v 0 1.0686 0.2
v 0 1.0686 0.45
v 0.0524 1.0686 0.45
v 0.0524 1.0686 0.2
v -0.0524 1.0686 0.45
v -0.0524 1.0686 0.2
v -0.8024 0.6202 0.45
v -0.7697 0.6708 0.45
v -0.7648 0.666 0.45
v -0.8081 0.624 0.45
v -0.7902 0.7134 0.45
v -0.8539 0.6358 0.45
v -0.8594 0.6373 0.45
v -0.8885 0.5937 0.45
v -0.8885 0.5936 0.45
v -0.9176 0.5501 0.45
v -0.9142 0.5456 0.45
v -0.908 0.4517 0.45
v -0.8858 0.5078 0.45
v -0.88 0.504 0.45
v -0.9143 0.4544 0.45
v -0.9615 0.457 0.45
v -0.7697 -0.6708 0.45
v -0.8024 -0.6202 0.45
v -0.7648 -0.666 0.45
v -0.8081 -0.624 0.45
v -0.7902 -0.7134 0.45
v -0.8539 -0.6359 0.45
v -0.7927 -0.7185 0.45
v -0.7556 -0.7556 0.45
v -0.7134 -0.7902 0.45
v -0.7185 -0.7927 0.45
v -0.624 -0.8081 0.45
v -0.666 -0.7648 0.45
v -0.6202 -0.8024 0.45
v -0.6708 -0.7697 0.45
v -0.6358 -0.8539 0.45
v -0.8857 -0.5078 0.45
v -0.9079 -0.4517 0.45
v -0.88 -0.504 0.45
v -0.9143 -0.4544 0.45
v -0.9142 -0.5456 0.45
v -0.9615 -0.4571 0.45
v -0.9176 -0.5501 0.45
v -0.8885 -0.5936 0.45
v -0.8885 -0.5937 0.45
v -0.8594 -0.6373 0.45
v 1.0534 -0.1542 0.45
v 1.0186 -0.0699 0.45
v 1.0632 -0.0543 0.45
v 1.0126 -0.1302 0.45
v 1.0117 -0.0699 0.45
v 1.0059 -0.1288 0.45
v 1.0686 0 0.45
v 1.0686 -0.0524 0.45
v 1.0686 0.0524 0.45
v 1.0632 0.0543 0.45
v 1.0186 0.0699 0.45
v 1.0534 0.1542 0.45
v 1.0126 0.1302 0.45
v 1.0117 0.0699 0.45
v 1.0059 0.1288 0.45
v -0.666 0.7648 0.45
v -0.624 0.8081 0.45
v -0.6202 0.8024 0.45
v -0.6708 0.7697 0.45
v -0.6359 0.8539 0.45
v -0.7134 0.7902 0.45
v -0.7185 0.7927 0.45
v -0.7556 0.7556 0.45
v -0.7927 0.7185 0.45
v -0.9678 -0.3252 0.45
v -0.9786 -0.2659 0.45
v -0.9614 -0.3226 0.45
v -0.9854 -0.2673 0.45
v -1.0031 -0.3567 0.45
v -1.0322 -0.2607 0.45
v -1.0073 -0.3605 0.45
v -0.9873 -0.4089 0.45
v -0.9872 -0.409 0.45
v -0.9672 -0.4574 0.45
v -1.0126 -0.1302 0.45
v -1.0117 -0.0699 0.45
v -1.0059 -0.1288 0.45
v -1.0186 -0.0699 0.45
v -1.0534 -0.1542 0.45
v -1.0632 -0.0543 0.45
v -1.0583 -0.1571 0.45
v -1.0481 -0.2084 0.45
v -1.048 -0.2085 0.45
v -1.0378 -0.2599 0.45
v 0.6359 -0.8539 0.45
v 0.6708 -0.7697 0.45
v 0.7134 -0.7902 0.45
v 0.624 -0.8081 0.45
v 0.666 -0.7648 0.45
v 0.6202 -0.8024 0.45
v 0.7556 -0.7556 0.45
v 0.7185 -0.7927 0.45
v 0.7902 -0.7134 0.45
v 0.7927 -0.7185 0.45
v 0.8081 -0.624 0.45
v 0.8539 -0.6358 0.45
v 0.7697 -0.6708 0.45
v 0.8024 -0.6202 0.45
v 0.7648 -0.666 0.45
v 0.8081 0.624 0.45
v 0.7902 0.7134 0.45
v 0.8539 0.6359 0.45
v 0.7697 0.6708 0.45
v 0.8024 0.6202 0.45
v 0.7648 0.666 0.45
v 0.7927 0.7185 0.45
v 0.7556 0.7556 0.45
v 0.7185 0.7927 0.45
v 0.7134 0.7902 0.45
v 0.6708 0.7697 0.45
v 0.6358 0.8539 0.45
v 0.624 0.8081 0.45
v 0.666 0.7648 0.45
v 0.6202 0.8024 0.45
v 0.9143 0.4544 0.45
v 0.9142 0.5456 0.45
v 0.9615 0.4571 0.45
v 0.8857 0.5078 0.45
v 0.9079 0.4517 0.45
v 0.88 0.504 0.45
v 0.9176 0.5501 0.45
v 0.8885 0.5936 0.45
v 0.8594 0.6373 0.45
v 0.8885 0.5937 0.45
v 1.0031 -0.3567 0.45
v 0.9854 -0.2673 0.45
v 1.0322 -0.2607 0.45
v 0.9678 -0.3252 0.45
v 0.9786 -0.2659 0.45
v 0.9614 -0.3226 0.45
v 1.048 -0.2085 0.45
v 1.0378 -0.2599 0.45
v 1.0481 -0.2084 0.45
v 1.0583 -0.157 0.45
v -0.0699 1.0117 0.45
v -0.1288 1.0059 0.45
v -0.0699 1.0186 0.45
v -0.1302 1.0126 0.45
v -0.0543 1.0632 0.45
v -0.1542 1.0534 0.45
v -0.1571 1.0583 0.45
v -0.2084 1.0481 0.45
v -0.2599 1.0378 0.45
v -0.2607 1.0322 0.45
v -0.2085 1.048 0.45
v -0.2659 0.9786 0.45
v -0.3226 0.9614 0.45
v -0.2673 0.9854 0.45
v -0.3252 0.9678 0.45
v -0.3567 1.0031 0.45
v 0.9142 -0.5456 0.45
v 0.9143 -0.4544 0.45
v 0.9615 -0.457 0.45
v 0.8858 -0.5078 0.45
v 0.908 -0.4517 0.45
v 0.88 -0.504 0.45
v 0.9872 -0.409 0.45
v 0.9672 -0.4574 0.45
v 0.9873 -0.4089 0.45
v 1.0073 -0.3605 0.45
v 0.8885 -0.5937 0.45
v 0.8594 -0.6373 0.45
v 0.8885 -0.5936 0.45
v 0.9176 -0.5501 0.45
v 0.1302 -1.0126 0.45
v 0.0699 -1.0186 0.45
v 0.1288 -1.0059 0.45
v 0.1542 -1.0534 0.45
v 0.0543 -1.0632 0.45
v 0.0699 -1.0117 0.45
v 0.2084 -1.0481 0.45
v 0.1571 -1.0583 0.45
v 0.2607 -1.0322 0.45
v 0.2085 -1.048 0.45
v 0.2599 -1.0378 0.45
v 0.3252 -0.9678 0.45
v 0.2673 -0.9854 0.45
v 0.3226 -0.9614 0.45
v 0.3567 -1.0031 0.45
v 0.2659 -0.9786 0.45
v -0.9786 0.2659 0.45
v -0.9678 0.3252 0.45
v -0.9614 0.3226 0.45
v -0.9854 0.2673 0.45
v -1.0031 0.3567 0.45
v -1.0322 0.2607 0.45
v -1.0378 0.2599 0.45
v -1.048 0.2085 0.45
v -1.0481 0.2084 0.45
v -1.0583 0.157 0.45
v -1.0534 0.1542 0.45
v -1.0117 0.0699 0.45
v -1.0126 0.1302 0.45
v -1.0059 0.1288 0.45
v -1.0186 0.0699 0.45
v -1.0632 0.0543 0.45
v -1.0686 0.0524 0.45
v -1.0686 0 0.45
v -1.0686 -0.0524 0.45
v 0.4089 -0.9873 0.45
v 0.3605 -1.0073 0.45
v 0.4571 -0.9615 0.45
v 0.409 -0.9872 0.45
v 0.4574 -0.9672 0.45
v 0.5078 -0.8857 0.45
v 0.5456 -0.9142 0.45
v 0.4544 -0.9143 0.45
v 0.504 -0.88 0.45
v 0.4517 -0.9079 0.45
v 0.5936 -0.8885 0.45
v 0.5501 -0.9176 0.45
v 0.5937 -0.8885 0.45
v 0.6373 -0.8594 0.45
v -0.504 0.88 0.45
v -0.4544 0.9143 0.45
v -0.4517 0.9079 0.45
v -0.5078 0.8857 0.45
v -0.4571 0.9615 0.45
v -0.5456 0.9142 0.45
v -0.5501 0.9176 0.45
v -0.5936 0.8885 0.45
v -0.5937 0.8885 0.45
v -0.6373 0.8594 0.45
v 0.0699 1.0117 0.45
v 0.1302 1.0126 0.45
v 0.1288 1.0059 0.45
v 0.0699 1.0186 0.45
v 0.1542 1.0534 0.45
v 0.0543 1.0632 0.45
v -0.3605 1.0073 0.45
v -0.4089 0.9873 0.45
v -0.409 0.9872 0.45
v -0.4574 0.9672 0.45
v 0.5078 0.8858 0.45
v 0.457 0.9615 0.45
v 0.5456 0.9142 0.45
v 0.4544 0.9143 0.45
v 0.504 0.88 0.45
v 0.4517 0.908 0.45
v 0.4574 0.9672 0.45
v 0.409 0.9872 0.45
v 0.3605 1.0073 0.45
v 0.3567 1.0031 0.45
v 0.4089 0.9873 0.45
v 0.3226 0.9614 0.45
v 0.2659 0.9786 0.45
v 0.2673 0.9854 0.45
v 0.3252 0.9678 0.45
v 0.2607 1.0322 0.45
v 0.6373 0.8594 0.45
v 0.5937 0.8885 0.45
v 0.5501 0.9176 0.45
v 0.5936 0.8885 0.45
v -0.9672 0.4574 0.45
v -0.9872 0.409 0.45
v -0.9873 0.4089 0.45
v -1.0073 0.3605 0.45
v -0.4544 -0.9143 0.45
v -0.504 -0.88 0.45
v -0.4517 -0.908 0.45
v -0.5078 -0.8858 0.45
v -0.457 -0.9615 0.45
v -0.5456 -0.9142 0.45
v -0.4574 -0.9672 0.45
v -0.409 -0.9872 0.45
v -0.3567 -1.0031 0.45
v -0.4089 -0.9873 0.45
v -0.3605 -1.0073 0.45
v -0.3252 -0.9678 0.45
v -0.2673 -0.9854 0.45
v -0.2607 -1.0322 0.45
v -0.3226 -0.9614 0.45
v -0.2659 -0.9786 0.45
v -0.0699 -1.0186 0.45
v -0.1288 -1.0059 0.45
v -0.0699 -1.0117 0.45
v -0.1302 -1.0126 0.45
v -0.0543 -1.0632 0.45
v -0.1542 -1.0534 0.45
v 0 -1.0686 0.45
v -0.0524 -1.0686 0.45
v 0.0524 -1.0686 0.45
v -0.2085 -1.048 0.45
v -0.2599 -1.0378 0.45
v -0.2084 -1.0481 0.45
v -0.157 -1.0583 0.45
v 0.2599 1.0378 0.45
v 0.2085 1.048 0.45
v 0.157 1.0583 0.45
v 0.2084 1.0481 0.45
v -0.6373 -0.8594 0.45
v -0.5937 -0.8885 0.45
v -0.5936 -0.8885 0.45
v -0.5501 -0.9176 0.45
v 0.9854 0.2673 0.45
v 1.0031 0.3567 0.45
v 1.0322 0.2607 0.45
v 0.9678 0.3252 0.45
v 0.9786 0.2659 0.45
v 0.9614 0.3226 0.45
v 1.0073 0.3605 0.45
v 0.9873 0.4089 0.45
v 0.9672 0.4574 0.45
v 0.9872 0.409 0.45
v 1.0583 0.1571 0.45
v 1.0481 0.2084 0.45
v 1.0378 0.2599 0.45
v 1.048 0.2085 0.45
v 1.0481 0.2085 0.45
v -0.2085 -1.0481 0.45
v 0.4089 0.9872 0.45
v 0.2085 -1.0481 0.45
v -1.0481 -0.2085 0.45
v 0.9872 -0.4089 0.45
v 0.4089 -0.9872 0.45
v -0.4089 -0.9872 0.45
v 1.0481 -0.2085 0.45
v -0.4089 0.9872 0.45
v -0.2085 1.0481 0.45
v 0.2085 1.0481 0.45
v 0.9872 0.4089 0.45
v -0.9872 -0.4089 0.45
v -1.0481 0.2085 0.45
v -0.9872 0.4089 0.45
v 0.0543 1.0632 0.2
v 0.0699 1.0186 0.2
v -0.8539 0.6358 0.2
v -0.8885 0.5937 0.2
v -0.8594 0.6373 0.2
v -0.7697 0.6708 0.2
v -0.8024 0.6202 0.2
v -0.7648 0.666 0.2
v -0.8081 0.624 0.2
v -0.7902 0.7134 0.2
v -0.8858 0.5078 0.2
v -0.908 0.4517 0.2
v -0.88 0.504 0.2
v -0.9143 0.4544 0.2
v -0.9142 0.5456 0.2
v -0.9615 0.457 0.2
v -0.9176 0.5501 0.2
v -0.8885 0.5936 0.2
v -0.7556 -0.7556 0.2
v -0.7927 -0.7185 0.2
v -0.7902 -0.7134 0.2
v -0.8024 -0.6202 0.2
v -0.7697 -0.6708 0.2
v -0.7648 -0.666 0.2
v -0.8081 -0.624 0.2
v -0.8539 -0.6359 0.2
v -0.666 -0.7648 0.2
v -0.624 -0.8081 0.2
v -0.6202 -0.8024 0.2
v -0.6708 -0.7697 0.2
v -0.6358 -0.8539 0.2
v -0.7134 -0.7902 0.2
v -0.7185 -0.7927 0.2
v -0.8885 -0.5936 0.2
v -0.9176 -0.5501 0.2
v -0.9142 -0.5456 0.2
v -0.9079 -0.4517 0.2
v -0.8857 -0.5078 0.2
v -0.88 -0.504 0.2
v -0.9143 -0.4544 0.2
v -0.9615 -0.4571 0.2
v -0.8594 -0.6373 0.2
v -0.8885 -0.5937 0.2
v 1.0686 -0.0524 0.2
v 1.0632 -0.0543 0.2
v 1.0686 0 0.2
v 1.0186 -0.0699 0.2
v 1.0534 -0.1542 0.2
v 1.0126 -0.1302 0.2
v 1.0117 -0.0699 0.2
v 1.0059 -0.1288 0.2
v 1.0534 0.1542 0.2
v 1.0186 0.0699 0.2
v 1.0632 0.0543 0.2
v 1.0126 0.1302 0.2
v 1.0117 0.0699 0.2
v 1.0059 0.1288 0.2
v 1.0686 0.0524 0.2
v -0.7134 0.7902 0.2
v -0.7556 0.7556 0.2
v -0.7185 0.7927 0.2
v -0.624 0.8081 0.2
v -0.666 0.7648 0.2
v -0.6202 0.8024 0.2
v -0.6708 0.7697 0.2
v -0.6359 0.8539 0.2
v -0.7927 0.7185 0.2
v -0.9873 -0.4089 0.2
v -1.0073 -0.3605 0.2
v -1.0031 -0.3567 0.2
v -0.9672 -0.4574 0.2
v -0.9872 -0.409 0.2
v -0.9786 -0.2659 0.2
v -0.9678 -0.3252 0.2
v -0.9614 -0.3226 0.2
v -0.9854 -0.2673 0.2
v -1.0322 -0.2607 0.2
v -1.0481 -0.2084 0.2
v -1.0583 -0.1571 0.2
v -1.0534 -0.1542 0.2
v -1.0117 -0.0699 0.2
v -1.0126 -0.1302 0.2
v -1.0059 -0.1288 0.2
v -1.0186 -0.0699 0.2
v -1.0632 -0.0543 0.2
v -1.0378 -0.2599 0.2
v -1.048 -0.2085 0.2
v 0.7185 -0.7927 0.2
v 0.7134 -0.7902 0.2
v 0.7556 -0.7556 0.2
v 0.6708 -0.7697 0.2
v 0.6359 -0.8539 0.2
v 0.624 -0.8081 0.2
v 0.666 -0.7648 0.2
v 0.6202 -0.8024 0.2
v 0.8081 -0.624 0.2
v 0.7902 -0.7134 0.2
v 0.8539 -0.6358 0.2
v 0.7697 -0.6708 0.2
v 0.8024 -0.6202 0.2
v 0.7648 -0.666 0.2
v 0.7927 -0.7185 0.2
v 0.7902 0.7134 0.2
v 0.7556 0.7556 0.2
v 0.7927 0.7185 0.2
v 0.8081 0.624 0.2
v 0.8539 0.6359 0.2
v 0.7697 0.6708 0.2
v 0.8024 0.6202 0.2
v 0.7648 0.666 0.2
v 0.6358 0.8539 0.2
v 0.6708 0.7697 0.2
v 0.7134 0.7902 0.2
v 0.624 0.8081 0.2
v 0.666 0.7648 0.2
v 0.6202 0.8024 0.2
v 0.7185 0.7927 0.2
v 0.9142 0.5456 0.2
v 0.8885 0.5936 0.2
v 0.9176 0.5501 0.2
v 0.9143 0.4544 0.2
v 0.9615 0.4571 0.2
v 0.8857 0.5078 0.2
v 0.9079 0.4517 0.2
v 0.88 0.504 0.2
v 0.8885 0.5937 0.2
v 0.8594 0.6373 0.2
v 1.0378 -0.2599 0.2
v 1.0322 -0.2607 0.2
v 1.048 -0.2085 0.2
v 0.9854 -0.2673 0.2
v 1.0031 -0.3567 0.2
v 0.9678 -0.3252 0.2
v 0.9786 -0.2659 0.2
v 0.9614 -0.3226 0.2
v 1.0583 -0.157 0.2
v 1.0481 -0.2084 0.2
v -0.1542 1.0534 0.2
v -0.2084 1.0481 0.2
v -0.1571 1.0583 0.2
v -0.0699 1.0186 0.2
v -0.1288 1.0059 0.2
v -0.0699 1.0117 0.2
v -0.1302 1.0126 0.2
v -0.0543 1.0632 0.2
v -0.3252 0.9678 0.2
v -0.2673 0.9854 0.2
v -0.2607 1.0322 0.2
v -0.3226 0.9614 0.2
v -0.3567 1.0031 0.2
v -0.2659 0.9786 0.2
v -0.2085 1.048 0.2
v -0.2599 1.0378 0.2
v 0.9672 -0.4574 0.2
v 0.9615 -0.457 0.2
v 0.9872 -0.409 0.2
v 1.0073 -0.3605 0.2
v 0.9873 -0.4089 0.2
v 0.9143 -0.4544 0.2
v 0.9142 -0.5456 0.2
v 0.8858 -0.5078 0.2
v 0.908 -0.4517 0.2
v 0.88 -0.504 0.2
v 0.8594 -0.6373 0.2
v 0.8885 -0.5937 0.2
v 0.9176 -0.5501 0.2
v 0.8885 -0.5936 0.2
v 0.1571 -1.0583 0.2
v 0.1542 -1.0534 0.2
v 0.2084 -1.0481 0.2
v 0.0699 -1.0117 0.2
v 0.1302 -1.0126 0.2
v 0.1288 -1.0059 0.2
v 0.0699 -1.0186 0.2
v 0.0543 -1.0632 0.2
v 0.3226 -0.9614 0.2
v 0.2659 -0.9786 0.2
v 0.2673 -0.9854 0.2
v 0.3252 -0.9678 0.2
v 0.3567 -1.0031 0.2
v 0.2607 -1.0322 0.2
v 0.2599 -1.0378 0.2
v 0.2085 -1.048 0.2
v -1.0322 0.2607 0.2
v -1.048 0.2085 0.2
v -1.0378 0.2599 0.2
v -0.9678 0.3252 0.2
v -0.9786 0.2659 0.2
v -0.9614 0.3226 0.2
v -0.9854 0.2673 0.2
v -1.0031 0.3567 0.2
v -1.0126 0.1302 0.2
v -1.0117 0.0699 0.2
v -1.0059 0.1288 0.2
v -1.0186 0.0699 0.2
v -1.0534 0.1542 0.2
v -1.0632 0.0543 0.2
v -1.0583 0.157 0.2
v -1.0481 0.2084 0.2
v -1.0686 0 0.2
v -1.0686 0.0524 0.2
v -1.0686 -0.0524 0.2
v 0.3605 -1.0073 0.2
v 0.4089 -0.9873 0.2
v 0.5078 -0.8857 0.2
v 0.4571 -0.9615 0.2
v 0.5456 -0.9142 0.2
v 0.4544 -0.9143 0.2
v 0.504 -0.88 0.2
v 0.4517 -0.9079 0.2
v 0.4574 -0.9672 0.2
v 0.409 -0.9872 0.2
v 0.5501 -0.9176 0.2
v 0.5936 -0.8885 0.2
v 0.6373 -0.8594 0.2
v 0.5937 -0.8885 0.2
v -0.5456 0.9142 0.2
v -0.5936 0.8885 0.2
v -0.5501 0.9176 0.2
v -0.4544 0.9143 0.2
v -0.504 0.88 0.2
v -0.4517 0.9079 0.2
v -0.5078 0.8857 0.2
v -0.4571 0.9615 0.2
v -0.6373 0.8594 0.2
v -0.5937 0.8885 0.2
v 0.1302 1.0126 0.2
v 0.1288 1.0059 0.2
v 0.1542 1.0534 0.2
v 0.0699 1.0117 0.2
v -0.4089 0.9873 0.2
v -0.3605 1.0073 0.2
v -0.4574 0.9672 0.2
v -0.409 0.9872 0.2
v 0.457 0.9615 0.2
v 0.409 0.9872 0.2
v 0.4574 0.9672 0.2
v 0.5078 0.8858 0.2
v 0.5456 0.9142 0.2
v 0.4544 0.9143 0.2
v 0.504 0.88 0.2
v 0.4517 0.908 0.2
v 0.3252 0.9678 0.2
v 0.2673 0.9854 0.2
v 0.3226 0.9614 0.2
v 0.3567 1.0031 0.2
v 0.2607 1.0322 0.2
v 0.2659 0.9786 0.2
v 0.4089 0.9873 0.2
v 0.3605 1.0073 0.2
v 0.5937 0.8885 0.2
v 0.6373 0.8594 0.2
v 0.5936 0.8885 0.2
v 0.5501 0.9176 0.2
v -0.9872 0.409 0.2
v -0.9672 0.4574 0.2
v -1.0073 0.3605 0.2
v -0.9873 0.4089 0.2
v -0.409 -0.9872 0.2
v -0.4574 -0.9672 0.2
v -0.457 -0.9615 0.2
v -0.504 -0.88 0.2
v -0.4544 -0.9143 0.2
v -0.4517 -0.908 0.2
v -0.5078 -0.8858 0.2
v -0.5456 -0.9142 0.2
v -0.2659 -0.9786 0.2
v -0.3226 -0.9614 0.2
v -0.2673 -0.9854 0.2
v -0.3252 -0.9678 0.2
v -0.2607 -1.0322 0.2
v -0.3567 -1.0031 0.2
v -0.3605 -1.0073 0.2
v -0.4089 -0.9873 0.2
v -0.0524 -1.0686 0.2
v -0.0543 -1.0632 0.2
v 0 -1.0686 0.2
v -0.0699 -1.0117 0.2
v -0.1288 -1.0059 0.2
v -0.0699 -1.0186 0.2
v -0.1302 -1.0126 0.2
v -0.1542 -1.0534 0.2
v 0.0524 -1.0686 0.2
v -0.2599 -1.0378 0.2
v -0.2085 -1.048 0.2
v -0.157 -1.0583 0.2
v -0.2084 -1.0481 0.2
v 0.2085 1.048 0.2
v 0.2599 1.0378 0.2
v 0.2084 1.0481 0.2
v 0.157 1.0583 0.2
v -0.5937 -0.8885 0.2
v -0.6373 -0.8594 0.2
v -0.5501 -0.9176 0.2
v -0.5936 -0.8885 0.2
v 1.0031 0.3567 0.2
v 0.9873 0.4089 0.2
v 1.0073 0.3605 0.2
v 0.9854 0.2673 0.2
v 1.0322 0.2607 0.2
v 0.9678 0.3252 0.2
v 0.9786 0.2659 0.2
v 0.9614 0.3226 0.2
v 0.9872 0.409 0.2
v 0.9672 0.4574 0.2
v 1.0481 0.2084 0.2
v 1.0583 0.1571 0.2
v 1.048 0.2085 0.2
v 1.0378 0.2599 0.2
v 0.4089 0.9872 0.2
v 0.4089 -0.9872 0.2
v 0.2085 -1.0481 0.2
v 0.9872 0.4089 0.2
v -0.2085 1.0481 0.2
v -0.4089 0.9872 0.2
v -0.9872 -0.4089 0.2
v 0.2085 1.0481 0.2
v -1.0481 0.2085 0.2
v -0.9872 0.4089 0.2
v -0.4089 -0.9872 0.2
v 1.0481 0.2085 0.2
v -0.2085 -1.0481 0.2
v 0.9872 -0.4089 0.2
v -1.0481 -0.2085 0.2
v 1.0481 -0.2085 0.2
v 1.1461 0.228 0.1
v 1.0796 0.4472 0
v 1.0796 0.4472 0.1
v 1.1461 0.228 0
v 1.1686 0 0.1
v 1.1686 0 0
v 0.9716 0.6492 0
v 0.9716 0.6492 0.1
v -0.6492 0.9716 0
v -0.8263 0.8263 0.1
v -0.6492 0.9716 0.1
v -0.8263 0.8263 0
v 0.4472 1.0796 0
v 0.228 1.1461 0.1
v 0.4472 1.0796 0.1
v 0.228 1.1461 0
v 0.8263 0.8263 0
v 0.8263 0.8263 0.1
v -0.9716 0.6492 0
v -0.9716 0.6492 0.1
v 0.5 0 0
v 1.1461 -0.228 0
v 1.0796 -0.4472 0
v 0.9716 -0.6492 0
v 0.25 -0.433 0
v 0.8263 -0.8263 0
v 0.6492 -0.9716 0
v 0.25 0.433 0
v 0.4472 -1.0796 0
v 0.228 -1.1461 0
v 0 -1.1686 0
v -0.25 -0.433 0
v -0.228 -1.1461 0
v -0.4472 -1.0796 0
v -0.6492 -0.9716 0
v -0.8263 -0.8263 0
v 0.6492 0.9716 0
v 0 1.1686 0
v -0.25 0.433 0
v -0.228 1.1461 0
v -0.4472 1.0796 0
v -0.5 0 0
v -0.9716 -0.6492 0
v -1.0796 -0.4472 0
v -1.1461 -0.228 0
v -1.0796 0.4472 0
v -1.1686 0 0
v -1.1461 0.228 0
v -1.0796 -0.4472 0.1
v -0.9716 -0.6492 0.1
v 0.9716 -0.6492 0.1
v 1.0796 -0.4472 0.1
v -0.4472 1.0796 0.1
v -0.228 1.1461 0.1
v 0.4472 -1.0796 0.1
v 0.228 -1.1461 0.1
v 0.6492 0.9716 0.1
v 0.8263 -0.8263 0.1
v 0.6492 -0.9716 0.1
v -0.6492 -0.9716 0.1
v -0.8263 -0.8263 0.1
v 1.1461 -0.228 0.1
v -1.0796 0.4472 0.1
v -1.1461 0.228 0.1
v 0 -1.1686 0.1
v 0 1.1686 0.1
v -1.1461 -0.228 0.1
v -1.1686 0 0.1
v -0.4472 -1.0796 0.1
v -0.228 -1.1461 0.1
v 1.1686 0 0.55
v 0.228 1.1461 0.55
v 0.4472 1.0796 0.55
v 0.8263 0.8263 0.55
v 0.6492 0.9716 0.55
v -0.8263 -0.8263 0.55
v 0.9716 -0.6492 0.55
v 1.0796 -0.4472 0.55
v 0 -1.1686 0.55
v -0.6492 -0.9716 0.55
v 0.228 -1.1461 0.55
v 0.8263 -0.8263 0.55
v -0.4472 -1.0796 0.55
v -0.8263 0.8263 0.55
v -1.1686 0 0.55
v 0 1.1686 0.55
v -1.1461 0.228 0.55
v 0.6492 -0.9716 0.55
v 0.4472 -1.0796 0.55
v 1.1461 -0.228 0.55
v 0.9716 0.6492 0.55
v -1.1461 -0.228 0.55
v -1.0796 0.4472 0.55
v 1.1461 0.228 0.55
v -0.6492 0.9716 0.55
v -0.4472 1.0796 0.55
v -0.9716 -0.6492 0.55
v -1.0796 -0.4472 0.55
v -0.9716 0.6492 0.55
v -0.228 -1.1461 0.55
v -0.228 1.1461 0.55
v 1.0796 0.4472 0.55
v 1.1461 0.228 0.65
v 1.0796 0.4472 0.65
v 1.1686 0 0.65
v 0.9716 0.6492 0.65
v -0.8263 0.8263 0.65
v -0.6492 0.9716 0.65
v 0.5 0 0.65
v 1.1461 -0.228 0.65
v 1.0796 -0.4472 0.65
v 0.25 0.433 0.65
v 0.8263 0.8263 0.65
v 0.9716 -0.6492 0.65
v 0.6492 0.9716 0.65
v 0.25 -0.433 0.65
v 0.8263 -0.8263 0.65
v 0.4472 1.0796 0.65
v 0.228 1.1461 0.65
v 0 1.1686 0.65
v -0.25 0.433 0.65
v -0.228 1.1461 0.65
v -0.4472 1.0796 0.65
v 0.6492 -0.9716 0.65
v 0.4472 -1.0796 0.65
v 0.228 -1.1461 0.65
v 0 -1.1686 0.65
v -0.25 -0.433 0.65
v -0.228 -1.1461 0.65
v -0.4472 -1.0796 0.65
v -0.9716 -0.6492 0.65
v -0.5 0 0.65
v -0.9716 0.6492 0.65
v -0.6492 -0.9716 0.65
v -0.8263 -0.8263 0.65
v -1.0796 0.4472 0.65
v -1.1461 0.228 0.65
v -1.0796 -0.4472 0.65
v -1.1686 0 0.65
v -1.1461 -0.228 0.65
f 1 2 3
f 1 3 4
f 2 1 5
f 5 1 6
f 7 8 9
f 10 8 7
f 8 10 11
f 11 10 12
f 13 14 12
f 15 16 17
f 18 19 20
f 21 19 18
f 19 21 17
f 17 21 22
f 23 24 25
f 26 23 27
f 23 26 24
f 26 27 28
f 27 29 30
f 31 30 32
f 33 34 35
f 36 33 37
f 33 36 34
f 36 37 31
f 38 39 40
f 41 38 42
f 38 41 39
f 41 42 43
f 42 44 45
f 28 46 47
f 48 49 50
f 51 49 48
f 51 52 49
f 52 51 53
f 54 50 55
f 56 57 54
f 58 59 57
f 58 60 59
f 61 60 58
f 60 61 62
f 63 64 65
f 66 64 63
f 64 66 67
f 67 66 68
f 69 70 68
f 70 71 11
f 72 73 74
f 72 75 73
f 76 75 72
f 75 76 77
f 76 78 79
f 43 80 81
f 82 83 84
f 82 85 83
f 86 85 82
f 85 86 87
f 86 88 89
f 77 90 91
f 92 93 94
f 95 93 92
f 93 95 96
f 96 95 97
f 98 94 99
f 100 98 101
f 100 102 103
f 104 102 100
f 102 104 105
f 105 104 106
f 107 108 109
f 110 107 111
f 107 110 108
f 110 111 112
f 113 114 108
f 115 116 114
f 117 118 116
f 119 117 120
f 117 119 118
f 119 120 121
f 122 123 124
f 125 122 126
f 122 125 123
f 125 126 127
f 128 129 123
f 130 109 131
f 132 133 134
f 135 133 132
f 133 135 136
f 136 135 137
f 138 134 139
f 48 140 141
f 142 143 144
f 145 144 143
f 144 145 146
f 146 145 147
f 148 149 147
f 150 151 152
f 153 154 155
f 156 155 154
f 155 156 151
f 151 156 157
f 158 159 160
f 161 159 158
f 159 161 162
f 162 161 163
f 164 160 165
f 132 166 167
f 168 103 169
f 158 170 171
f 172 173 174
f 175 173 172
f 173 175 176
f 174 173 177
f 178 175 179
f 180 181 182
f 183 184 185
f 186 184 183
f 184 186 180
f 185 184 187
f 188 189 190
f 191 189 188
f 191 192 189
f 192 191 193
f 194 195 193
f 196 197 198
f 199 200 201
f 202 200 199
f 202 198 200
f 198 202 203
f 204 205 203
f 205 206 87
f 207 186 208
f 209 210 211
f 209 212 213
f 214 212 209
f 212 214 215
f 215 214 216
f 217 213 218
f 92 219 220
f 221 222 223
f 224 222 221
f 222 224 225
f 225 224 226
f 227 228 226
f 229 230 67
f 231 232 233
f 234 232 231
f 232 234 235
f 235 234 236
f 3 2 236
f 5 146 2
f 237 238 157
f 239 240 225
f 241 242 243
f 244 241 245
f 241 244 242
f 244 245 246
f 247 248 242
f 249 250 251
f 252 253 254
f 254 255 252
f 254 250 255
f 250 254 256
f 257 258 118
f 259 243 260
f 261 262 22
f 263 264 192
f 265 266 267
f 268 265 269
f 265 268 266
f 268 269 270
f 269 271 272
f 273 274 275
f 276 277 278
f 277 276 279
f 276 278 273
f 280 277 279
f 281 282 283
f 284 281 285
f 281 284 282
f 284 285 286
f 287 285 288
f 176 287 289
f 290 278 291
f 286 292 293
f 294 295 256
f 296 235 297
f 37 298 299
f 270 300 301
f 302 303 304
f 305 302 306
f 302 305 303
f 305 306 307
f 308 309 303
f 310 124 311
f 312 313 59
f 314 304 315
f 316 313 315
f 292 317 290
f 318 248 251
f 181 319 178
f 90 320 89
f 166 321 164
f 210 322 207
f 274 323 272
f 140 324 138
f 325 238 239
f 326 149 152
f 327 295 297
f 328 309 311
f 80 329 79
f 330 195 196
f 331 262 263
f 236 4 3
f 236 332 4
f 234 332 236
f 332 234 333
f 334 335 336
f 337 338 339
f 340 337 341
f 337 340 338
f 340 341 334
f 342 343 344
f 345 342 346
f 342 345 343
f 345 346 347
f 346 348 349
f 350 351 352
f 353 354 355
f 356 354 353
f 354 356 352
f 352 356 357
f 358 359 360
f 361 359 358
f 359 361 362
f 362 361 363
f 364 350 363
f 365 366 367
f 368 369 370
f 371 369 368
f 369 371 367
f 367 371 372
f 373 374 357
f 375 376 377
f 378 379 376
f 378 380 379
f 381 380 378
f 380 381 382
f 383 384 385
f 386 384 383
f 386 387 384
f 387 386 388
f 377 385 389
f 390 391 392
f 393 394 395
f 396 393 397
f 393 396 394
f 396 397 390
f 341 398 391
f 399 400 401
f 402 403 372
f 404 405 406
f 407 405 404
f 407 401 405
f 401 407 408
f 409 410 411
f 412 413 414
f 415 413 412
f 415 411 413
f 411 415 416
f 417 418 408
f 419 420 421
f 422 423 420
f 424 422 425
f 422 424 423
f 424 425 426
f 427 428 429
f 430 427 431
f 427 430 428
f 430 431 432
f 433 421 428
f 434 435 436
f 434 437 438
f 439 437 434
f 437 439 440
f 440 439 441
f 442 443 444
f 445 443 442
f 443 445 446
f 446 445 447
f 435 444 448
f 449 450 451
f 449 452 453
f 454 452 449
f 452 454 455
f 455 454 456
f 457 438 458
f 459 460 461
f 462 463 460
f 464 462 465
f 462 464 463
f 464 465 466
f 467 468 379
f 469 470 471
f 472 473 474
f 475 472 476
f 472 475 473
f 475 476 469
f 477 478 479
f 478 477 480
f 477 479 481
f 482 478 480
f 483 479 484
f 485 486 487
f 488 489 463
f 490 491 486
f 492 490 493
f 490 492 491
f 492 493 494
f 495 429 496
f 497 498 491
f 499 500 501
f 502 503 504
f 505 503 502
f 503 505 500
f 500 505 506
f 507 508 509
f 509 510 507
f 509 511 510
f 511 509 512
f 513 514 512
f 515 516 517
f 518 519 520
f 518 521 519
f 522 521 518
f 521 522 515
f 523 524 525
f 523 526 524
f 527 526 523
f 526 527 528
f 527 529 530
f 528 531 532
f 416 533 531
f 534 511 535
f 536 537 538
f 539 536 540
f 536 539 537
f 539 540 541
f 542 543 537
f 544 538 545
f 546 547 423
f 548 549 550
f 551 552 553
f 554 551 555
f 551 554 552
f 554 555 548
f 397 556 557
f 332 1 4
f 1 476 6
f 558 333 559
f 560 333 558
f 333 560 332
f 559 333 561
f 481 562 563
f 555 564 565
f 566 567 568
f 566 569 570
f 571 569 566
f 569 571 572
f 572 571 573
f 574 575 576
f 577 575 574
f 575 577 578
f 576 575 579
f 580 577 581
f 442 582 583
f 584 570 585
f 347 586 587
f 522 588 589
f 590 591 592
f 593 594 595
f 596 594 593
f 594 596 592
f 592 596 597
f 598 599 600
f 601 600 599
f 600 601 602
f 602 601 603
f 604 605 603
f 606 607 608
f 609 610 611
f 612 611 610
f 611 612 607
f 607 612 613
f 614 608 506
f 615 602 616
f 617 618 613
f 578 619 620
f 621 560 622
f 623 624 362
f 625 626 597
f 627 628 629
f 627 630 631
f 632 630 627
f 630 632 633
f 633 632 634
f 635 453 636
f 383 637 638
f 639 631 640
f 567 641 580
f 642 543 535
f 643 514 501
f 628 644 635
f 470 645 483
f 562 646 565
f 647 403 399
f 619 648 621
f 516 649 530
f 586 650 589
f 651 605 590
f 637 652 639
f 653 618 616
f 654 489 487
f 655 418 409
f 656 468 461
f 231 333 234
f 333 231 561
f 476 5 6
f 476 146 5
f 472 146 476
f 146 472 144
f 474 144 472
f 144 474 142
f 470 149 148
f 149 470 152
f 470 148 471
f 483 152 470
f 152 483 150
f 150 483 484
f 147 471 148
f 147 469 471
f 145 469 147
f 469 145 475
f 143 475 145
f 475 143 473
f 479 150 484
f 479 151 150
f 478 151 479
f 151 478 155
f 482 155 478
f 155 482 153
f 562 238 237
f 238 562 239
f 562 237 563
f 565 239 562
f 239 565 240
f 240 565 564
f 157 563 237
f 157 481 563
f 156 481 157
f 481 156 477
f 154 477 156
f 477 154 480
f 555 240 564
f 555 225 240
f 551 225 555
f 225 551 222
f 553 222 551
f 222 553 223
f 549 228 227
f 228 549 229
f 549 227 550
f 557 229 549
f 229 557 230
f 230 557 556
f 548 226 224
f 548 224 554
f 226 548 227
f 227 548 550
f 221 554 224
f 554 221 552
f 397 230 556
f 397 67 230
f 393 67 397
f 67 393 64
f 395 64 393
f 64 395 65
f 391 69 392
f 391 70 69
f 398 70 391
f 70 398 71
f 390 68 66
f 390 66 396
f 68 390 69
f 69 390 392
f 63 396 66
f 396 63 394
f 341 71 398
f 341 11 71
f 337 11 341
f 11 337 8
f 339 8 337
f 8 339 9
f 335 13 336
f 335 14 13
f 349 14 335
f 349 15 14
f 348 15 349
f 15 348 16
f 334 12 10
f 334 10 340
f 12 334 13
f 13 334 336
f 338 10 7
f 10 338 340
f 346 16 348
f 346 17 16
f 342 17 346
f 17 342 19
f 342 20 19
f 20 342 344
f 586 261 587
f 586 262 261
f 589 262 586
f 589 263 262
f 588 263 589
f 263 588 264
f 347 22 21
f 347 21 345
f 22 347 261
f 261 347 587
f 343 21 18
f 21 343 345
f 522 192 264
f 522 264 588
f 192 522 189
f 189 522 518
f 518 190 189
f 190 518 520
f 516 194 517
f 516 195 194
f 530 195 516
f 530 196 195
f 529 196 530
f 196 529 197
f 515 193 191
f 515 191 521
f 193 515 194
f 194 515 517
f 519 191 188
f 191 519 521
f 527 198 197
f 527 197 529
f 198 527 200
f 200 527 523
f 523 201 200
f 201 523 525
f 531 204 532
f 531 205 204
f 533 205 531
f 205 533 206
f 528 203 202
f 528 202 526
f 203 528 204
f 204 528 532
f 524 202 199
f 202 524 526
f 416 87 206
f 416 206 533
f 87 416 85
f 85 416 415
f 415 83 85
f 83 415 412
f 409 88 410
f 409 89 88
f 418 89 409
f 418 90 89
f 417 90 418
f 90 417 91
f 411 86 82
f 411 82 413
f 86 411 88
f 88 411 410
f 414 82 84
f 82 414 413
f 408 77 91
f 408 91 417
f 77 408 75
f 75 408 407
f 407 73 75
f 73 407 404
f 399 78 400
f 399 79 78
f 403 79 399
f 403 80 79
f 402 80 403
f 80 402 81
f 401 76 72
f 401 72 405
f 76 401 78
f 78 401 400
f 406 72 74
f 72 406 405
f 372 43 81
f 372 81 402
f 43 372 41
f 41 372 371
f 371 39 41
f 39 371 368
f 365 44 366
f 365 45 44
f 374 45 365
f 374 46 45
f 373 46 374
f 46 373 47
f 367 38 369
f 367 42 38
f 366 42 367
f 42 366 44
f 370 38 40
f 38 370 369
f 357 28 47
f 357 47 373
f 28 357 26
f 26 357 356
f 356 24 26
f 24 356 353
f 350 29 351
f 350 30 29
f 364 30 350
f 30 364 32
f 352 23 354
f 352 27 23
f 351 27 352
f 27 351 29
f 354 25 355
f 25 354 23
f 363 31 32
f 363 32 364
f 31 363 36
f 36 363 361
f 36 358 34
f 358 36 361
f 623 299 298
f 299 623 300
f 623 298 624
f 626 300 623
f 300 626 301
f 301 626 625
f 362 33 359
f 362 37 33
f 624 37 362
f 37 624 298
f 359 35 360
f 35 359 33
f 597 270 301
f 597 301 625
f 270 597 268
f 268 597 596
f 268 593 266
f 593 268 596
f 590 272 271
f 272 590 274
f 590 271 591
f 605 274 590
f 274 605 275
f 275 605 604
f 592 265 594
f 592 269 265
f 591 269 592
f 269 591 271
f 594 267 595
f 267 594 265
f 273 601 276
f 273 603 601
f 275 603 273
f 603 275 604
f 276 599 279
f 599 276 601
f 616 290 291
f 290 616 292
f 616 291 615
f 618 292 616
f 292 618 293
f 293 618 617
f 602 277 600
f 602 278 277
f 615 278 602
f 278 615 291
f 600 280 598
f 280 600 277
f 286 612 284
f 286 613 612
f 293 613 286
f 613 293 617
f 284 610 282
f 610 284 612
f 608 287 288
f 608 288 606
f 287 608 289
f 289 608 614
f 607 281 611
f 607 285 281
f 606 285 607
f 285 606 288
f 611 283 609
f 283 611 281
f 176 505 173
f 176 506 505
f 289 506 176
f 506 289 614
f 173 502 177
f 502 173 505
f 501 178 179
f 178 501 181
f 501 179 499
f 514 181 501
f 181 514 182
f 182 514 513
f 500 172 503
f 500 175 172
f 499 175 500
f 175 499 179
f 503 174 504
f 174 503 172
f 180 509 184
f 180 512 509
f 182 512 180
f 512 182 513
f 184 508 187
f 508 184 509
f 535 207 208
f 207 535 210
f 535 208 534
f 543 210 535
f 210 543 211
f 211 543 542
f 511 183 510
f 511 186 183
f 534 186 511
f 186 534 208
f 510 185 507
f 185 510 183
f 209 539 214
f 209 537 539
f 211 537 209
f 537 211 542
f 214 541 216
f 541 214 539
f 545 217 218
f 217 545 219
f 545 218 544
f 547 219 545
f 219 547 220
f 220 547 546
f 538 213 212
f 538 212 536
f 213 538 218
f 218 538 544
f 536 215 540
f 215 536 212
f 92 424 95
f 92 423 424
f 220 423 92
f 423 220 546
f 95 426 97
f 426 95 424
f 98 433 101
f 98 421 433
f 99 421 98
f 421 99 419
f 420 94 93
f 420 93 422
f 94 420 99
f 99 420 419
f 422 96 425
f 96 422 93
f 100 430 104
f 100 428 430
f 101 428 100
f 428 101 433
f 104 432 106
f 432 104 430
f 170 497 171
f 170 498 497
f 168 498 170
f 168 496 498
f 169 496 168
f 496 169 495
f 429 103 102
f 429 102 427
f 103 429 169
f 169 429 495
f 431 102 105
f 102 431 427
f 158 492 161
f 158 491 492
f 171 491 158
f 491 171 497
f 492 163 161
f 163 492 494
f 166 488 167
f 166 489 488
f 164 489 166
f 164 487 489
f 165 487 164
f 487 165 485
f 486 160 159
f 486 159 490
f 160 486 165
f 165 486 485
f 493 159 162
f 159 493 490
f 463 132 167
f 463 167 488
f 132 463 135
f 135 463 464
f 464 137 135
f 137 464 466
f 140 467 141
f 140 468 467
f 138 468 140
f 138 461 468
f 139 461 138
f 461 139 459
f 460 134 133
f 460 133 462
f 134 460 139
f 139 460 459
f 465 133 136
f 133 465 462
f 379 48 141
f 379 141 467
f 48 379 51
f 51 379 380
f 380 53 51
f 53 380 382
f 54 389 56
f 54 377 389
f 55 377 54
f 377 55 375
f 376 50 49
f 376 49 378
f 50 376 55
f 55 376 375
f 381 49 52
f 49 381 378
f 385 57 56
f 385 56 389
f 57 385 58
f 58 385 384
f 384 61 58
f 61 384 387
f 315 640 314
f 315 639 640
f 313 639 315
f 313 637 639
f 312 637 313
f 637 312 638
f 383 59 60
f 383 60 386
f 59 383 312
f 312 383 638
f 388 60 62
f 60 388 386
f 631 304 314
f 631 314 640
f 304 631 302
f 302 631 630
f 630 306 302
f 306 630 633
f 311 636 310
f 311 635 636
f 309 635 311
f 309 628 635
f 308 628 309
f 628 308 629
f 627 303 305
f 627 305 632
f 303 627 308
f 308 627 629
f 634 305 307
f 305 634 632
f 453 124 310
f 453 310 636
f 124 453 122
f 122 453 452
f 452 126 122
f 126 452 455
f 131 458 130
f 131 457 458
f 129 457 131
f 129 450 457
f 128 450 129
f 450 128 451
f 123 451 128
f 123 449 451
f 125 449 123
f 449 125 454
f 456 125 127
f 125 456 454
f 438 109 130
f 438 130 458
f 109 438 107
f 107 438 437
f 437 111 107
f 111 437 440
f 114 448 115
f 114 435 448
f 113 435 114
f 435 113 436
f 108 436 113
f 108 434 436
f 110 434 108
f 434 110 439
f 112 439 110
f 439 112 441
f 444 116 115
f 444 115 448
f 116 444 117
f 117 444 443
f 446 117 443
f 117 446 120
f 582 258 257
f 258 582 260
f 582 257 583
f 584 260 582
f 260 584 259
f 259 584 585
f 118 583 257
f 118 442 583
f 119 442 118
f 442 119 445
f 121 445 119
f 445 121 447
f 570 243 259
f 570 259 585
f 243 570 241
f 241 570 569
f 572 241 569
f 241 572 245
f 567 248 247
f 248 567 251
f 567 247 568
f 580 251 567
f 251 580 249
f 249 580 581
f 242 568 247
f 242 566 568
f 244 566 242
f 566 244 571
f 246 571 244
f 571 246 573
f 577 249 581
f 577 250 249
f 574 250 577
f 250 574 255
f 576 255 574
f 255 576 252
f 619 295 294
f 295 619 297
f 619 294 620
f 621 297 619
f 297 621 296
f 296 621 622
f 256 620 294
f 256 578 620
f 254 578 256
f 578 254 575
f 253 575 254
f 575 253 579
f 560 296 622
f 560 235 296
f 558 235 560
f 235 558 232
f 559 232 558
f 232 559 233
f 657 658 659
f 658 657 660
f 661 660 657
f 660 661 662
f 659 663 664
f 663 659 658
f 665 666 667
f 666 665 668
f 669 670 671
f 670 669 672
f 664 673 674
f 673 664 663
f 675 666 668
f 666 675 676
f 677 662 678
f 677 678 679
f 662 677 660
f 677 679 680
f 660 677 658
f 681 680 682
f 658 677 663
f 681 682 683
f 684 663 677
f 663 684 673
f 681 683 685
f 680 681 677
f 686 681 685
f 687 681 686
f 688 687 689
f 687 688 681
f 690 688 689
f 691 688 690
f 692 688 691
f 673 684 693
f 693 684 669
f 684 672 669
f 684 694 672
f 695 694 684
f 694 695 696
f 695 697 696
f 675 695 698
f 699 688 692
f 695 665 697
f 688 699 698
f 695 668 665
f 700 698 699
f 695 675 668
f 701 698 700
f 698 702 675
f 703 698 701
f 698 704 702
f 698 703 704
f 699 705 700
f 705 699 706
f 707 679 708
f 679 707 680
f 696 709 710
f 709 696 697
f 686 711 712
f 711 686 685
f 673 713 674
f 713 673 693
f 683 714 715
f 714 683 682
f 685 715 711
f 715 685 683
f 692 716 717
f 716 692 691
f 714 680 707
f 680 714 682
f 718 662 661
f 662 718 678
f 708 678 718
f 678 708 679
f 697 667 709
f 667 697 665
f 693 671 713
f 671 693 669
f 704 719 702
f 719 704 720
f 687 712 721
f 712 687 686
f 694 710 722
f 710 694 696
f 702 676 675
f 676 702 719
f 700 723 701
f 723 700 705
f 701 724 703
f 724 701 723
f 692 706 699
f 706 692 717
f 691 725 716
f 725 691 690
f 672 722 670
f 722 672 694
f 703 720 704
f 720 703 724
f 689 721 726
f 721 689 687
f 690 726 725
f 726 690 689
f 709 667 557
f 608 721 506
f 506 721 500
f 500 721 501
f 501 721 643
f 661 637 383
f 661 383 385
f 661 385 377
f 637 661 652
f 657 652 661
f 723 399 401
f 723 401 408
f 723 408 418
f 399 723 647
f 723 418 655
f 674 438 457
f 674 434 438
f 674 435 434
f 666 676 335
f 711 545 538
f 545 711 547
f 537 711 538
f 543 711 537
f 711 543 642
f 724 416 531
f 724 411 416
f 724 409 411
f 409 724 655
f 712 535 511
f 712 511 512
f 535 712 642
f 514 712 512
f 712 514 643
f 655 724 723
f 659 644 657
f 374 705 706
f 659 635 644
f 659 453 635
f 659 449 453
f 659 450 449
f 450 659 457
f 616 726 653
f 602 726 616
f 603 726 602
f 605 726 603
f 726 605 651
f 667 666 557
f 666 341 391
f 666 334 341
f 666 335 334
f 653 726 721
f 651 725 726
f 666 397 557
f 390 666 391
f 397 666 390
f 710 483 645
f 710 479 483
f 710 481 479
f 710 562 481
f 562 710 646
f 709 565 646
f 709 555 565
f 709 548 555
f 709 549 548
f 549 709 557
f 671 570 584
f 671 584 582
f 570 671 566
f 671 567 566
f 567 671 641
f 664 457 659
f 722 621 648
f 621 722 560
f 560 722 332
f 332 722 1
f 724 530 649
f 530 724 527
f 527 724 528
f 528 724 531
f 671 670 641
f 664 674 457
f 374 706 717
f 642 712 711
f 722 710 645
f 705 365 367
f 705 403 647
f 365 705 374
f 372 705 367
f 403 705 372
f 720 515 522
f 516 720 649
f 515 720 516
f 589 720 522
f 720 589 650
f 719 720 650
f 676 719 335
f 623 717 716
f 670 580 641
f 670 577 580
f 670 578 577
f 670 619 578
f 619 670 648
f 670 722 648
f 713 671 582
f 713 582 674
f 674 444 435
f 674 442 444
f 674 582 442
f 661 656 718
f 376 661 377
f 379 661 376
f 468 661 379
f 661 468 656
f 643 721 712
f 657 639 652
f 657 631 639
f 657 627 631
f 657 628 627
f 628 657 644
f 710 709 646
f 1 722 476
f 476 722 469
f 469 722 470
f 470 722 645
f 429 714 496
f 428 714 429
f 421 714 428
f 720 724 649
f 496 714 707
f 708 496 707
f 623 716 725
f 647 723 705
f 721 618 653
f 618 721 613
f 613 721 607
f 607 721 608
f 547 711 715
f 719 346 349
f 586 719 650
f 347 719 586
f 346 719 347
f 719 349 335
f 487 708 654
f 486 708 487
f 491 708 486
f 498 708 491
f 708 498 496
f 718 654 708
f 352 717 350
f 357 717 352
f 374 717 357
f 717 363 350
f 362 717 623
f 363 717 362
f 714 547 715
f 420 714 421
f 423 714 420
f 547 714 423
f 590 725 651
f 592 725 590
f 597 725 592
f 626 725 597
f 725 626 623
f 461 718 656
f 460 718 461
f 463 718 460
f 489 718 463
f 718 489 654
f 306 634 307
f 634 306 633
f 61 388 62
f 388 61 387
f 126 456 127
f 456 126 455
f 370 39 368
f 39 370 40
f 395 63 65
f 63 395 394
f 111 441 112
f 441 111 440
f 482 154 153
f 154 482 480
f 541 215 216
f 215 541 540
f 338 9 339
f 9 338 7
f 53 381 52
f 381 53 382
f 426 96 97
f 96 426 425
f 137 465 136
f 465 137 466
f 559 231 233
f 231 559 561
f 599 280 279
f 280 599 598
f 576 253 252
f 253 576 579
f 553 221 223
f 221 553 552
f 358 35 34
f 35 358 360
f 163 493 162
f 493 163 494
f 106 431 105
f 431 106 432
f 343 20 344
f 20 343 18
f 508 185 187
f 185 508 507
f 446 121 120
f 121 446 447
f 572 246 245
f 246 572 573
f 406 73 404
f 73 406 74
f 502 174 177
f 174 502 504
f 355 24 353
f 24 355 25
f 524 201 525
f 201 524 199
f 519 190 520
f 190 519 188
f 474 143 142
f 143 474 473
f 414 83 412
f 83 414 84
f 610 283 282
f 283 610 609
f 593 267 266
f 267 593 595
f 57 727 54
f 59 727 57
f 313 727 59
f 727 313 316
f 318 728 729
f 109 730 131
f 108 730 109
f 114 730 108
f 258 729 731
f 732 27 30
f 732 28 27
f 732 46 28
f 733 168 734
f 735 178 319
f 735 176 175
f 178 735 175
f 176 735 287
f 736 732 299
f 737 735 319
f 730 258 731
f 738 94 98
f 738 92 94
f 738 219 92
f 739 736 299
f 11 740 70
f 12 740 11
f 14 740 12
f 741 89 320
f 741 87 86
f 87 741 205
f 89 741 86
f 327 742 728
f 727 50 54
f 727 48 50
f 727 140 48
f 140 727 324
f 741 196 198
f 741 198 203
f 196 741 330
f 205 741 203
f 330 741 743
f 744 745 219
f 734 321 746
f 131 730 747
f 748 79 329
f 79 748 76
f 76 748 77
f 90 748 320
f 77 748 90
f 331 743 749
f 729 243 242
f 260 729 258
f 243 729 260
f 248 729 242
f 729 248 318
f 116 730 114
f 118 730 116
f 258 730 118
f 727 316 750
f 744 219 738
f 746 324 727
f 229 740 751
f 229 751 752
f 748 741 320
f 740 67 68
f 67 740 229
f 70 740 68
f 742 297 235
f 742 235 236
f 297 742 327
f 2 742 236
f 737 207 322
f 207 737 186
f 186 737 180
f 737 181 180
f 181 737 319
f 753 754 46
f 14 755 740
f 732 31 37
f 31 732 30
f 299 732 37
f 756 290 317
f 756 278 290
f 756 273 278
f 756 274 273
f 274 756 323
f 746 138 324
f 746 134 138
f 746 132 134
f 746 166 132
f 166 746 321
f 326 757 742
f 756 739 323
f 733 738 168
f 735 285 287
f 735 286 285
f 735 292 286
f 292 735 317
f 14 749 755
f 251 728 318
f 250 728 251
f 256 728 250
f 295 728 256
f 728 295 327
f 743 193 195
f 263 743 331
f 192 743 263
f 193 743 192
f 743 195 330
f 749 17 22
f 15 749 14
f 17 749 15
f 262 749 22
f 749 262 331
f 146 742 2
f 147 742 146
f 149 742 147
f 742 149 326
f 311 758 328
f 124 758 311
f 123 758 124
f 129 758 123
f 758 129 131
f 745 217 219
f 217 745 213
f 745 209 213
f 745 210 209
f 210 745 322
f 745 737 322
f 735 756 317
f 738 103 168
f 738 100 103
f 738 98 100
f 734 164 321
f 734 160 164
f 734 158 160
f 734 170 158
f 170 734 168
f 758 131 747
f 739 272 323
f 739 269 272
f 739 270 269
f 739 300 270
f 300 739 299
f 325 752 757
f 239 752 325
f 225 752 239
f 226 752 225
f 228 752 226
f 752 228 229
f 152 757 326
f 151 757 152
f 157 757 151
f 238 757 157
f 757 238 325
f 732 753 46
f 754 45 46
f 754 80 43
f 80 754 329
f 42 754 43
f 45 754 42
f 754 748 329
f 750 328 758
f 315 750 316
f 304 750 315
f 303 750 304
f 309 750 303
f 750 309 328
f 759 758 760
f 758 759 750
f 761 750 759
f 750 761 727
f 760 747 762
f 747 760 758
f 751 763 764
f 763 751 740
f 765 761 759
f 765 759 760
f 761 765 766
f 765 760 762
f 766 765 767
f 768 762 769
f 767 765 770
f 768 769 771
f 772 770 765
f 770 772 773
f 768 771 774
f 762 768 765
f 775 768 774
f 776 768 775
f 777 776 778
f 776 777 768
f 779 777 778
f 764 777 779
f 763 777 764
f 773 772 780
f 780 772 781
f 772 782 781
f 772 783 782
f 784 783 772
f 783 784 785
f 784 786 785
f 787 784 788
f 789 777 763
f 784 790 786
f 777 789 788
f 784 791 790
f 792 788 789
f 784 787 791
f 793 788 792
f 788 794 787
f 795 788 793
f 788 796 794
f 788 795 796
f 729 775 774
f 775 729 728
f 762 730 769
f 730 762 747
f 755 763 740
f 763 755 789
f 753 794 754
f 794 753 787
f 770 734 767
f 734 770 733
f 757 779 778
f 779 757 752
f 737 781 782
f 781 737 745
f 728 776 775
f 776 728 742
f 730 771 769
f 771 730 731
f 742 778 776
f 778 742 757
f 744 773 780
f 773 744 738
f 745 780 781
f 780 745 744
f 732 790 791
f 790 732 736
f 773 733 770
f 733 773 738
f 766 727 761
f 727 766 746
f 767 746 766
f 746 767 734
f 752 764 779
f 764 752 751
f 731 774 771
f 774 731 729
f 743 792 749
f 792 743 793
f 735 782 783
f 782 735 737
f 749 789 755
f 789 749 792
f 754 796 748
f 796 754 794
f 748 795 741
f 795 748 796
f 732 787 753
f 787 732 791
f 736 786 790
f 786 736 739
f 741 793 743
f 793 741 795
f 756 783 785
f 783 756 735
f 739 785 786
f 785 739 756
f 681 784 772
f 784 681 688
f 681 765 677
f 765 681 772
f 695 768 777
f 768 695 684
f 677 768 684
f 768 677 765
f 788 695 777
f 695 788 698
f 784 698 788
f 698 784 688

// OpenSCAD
module mxl_pulley (h, nteeth, fancy=true, flange_r=0, flange_angle=45, flange_extrude=0){
	pulley(h=h, nteeth=nteeth, h1=0.02, pitch=0.08, angle=40, toothwd=0.045, fancy=fancy, flange_r=flange_r, flange_angle=flange_angle, flange_extrude=flange_extrude);
}

module xl_pulley (h, nteeth, fancy=true, flange_r=0, flange_angle=45, flange_extrude=0){
	pulley(h=h, nteeth=nteeth, h1=0.05, pitch=0.2, angle=50, toothwd=0.101, fancy=fancy, flange_r=flange_r, flange_angle=flange_angle, flange_extrude=flange_extrude);
}

module l_pulley (h, nteeth, fancy=true, flange_r=0, flange_angle=45, flange_extrude=0){
	pulley(h=h, nteeth=nteeth, h1=0.075, pitch=0.375, angle=40, toothwd=0.183, fancy=fancy, flange_r=flange_r, flange_angle=flange_angle, flange_extrude=flange_extrude);
}

module h_pulley (h, nteeth, fancy=true, flange_r=0, flange_angle=45, flange_extrude=0){
	pulley(h=h, nteeth=nteeth, h1=0.09, pitch=0.5, angle=40, toothwd=0.241, fancy=fancy, flange_r=flange_r, flange_angle=flange_angle, flange_extrude=flange_extrude);
}

module xh_pulley (h, nteeth, fancy=true, flange_r=0, flange_angle=45, flange_extrude=0){
	pulley (h=h, nteeth=nteeth, h1=0.25, pitch=0.875, angle=40, toothwd=0.495, fancy=fancy, flange_r=flange_r, flange_angle=flange_angle, flange_extrude=flange_extrude);
}
	
module pulley (h, nteeth, h1, pitch, angle, toothwd, fancy, flange_r, flange_angle, flange_extrude){
	flange_ht = flange_r / tan(flange_angle);
	echo(flange_angle);
	echo(flange_r);
	echo(flange_extrude);
	a = pitch - toothwd;
	z_orig = 90 - (angle/2);
	t_orig = a + 2 * h1/tan(z_orig);

	phi = ((fancy==true)? 360.0/nteeth : 0);
	angle = angle - phi/2;
	r_base = (nteeth * pitch)/(2*3.1415926);
	ht_diff = 0; //r_base - sqrt(r_base*r_base - (toothwd/2)*(toothwd/2));
	h1 = h1 + ht_diff;
	r = r_base-ht_diff;
	z = 90 - (angle/2);
	t = a + 2 * h1/tan(z);
	tdiff = t_orig - t;
	b = a + tdiff;
	for (i=[0:nteeth-1]){
		rotate([0,0,i*(360.0/nteeth)]){
			translate([-t/2,0,flange_ht+flange_extrude]){
				linear_extrude(height=h){
					polygon(points=[[0,0],[0,r],[(t-b)/2, r+h1], [b + (t-b)/2, r+h1], [t, r], [t, 0]]);
				}
			}
		}
	}
	cylinder(r=flange_r + r_base + h1, h=flange_extrude, $fn=32);
	translate([0,0,flange_extrude]){
		cylinder(r1=flange_r + r_base + h1, r2=r_base + h1, h=flange_ht, $fn=32);
	}
	translate([0,0,flange_ht + flange_extrude]){
		cylinder(r=r_base, h=h, $fn=32);
	}
	translate([0,0,flange_ht+h+flange_extrude]){
		cylinder(r1=r_base + h1, r2=r_base + flange_r + h1, h=flange_ht, $fn=32);
	}
	translate([0,0,2*flange_ht+h+flange_extrude]){
		cylinder(r=flange_r + r_base + h1, h=flange_extrude, $fn=32);
	}

}

function tan (theta) = sin(theta)/cos(theta);

difference (){
	xl_pulley(h=0.25, nteeth=32, flange_r=0.1, flange_extrude=0.1);
	cylinder(r=0.5, h=100, center=true, $fn=6);
}
